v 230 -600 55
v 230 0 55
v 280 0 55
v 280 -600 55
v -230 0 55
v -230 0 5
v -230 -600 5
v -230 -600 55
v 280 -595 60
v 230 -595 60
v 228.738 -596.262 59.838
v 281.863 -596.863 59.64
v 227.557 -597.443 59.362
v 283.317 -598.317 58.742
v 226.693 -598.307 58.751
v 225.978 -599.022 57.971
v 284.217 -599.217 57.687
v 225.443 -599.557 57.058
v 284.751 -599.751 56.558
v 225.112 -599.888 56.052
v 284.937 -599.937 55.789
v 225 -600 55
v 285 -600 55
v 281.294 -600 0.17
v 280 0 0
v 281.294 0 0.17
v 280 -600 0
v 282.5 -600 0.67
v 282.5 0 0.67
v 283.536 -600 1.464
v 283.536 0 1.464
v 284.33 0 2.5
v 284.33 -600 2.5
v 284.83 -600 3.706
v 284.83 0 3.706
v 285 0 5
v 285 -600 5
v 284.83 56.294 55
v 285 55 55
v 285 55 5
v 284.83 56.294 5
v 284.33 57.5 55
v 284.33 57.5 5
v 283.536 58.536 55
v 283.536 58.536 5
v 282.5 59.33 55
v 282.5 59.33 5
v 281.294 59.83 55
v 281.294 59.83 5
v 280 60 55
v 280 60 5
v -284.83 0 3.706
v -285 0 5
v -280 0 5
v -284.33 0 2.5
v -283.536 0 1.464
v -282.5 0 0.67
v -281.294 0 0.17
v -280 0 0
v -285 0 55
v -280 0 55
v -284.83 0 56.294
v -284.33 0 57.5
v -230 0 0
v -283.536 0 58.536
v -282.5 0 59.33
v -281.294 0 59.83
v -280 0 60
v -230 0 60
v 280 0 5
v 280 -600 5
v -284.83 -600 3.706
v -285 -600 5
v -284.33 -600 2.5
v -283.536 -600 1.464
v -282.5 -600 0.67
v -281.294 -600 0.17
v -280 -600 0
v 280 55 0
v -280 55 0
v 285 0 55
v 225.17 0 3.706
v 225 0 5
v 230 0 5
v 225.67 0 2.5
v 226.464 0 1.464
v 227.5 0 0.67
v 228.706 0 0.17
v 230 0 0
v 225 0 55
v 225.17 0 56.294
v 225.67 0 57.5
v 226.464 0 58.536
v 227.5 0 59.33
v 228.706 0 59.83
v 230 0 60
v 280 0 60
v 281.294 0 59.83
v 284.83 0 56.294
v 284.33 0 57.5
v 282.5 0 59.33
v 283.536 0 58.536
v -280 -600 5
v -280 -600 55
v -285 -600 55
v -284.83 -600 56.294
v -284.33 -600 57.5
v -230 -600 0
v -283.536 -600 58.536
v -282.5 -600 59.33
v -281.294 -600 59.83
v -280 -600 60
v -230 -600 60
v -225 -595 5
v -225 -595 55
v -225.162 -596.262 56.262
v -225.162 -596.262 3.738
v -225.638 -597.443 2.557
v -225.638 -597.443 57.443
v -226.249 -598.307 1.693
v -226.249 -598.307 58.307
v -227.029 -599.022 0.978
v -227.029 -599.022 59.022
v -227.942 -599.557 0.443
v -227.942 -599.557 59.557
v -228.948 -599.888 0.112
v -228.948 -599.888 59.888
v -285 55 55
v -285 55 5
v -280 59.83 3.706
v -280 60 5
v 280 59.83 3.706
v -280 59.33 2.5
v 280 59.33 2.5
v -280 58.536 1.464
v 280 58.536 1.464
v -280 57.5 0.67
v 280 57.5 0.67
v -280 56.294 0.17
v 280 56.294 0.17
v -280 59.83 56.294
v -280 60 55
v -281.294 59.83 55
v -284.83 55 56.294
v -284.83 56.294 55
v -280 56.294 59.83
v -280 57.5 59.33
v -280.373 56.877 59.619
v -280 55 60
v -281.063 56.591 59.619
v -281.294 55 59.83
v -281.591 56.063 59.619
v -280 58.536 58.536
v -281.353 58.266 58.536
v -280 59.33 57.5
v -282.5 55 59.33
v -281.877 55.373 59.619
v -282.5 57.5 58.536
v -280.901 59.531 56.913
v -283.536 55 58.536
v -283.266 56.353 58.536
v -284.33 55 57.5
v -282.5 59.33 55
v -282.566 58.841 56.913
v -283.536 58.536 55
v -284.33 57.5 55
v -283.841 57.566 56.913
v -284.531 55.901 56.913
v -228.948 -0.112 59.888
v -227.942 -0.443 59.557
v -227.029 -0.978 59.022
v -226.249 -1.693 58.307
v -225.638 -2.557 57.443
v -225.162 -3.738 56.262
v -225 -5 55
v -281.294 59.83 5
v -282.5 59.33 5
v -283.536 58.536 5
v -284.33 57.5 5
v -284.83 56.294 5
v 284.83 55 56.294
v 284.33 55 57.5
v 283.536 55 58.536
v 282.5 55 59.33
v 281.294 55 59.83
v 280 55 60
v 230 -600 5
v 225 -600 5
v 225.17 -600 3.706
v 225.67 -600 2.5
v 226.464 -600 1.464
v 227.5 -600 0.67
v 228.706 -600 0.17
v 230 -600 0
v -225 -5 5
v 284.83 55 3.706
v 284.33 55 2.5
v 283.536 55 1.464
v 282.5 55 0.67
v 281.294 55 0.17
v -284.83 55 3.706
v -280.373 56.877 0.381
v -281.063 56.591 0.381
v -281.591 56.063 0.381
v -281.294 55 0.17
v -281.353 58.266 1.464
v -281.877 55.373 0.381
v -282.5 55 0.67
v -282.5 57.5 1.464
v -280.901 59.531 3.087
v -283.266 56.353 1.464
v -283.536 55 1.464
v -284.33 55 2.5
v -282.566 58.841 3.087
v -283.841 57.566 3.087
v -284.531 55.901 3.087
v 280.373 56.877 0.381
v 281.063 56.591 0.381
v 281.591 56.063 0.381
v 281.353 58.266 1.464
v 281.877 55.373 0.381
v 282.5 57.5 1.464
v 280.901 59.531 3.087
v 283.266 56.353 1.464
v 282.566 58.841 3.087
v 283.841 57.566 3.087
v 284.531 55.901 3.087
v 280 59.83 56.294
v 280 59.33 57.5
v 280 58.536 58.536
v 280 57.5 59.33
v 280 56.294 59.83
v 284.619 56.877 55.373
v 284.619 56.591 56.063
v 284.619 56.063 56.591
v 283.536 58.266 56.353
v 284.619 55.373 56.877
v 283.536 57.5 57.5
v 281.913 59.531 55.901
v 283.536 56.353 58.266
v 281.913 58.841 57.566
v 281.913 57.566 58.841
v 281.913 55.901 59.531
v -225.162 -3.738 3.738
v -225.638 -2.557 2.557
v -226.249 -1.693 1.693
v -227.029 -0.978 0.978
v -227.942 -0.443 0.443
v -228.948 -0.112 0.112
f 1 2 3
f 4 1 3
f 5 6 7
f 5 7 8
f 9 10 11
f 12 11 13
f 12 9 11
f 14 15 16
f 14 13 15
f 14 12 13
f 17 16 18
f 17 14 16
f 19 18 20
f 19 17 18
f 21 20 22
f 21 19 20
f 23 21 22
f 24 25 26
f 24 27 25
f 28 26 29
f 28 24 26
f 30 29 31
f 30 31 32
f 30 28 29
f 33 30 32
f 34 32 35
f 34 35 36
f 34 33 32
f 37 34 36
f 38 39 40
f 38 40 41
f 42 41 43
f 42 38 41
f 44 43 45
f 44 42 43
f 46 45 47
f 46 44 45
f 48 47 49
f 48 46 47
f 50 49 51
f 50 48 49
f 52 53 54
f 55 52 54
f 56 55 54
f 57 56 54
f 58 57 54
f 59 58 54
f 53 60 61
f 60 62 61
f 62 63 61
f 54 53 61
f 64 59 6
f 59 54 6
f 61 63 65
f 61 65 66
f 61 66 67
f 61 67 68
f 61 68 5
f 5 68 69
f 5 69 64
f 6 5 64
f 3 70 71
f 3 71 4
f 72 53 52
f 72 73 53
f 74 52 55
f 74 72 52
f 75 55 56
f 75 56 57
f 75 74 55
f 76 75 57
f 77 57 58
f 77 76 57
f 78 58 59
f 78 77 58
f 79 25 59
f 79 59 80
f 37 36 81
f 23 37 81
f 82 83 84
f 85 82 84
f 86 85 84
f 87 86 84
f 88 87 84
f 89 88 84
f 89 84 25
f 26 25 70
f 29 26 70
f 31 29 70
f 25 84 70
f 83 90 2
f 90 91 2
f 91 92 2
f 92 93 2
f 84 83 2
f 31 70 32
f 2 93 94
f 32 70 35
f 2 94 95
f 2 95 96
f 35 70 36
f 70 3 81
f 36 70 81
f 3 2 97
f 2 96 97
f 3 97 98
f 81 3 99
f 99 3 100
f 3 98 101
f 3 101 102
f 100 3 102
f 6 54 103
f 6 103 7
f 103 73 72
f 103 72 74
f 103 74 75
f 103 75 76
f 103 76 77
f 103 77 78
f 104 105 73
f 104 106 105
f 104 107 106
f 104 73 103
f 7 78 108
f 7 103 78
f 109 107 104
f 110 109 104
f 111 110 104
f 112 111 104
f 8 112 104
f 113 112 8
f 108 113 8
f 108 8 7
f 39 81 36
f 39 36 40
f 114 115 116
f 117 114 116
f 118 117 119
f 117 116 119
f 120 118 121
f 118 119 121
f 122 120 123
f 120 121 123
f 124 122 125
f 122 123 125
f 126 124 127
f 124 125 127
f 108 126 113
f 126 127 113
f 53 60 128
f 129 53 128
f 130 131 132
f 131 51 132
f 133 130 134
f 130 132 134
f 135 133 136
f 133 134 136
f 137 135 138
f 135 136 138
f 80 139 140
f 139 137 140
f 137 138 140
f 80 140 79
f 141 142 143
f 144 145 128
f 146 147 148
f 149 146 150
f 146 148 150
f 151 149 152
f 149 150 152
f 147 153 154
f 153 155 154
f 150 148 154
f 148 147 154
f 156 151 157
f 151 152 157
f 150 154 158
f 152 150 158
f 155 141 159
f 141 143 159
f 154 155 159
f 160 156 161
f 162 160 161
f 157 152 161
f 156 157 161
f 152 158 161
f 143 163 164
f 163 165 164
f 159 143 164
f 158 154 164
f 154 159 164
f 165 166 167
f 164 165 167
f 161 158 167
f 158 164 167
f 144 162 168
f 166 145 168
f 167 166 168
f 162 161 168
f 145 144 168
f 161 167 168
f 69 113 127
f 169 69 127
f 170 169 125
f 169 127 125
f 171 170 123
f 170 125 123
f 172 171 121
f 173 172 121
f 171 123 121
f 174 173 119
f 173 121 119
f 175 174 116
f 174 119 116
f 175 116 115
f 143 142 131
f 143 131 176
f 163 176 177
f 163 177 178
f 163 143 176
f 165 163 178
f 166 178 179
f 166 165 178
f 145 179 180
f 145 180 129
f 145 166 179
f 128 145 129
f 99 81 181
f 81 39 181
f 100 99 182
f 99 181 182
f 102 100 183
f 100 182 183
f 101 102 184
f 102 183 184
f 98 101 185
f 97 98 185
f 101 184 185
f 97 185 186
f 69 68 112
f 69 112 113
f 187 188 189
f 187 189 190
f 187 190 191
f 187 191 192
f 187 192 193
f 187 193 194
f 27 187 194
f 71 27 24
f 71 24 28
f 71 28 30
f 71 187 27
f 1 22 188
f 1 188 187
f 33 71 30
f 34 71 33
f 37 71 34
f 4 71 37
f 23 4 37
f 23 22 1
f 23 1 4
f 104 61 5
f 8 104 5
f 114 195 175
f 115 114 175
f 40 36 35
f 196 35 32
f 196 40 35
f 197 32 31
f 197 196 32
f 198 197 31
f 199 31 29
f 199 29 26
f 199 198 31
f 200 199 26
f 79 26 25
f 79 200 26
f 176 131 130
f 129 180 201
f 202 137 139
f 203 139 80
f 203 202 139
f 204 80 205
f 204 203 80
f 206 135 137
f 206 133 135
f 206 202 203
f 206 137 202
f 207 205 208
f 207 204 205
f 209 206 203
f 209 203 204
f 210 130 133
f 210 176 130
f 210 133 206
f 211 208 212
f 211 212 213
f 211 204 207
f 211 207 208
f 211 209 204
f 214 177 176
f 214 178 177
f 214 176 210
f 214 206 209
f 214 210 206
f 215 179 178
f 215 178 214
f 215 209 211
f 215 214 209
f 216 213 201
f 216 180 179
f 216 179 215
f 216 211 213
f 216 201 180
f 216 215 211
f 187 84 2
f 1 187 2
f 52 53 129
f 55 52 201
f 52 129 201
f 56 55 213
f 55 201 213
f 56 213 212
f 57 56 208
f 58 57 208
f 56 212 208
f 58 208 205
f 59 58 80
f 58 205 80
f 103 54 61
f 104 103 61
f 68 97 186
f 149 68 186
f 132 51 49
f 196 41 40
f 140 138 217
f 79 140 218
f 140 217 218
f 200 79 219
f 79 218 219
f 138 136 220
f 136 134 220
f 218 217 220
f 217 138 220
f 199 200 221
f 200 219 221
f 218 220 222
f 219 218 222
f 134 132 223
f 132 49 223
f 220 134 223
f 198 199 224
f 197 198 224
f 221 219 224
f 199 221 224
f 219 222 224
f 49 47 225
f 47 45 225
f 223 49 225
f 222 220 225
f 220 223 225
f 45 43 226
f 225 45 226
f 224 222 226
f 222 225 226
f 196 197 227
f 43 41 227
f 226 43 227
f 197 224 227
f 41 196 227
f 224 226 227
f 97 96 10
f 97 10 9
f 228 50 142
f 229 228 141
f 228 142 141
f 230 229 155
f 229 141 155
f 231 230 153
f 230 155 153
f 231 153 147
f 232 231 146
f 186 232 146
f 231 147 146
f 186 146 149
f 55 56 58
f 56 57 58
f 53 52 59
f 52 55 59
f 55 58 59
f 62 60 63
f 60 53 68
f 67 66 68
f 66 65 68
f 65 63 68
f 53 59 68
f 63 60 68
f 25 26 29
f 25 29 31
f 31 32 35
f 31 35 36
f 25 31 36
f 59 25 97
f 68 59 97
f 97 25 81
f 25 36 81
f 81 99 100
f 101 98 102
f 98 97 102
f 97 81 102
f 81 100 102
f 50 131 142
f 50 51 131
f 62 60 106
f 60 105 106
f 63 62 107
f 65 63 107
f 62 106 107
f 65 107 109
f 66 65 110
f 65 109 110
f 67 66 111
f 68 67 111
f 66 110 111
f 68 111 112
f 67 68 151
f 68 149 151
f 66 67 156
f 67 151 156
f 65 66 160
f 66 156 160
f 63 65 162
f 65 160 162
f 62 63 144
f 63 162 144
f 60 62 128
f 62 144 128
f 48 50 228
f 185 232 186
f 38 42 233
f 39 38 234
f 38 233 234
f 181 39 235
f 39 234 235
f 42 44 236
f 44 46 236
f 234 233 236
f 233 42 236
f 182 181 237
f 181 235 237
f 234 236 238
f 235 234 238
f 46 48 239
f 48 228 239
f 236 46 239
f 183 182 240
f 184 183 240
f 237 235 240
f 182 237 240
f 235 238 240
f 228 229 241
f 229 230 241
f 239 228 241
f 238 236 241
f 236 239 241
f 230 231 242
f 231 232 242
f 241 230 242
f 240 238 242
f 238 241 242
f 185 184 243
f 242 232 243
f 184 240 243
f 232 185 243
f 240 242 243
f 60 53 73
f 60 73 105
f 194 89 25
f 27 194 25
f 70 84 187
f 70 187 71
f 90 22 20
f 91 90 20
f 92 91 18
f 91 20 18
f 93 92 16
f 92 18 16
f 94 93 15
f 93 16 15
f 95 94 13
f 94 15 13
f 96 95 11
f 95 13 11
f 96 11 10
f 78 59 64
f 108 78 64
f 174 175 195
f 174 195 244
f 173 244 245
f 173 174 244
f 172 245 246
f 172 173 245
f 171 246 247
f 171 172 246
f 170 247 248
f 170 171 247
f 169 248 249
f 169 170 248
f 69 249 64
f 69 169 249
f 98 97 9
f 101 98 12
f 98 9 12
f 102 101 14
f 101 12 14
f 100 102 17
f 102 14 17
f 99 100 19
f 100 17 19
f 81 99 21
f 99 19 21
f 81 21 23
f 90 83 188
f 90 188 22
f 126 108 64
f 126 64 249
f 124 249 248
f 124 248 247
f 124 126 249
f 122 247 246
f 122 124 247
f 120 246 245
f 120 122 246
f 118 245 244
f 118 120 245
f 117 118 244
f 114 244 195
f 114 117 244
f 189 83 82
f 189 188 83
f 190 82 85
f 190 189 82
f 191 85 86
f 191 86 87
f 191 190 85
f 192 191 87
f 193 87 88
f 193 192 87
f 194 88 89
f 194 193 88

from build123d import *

# Parameters (mm, degrees)
F0_W     = 60
F0_H     = 60
F0_W_2   = 50
F0_H_2   = 50
F1_DEPTH = 600
F2_W     = 60
F2_H     = 60
F3_DEPTH = 285
F4_R     = 4.99999
F4_2_R   = 4.99999
F4_3_R   = 4.99999


# Not quite as in the source:
# - a fillet or chamfer is up to 0.001 mm smaller than in the source, because OpenCascade refuses the exact size


with BuildPart() as f1:
    # F0 (on Front) → F1 (new body)
    with BuildSketch(Plane.XZ):
        with Locations((255, 30)):
            Rectangle(F0_W, F0_H)
        with Locations((255, 30)):
            Rectangle(F0_W_2, F0_H_2, mode=Mode.SUBTRACT)
    extrude(amount=F1_DEPTH)

    # F4#3 (radius 5 in the source; OpenCascade refuses exactly that, so slightly less here)
    f4_3_edges = [f1.edges().sort_by_distance(p)[0] for p in [
        (225, -300, 60),
        (255, -600, 60),
        (285, -300, 60),
        (285, -300, 0),
        (225, -300, 0),
    ]]
    fillet(f4_3_edges, radius=F4_3_R)


with BuildPart() as f1b:
    # F0 (on Front) → F1, piece 2 (new body)
    with BuildSketch(Plane.XZ):
        with Locations((-255, 30)):
            Rectangle(F0_W, F0_H)
        with Locations((-255, 30)):
            Rectangle(F0_W_2, F0_H_2, mode=Mode.SUBTRACT)
    extrude(amount=F1_DEPTH)

    # F4#2 (radius 5 in the source; OpenCascade refuses exactly that, so slightly less here)
    f4_2_edges = [f1b.edges().sort_by_distance(p)[0] for p in [
        (-225, -300, 0),
        (-225, -300, 60),
        (-225, 0, 30),
        (-225, -600, 30),
        (-285, -300, 60),
        (-285, -300, 0),
    ]]
    fillet(f4_2_edges, radius=F4_2_R)


with BuildPart() as f3:
    # F2 (on Right) → F3 (new body, symmetric)
    with BuildSketch(Plane.YZ):
        with Locations((30, 30)):
            Rectangle(F2_W, F2_H)
    extrude(amount=F3_DEPTH, both=True)

    # F4 (radius 5 in the source; OpenCascade refuses exactly that, so slightly less here)
    f4_edges = [f3.edges().sort_by_distance(p)[0] for p in [
        (-285, 60, 30),
        (0, 60, 60),
        (285, 60, 30),
        (0, 60, 0),
        (-285, 30, 60),
        (-285, 30, 0),
        (285, 30, 60),
        (285, 30, 0),
    ]]
    fillet(f4_edges, radius=F4_R)


solid = Compound([f1.part, f1b.part, f3.part])
